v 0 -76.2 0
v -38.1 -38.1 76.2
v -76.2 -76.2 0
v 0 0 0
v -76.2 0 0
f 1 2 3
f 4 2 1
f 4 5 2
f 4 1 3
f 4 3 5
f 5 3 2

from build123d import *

# Parameters (mm, degrees)
F0_W     = 76.2
F0_H     = 76.2
F1_DEPTH = 76.2
F4_DEPTH = 76.2
F5_DEPTH = 76.2


with BuildPart() as f1:
    # F0 (on Right) → F1 (new body)
    with BuildSketch(Plane.YZ):
        with Locations((-38.1, 38.1)):
            Rectangle(F0_W, F0_H)
    extrude(amount=-F1_DEPTH)

    # F3 (on face) → F4 (cut)
    with BuildSketch(Plane(origin=(-76.2, 0, 0), x_dir=(0, -1, 0), z_dir=(-1, 0, 0))):
        Polygon((0, 76.2), (0, 0), (38.1, 76.2), align=None)
        Polygon((38.1, 76.2), (76.2, 0), (76.2, 76.2), align=None)
    extrude(amount=-F4_DEPTH, mode=Mode.SUBTRACT)

    # F2 (on face) → F5 (cut)
    with BuildSketch(Plane.XZ.offset(76.2)):
        Polygon((-76.2, 0), (-38.1, 76.2), (-76.2, 76.2), align=None)
        Polygon((0, 76.2), (-38.1, 76.2), (0, 0), align=None)
    extrude(amount=-F5_DEPTH, mode=Mode.SUBTRACT)


solid = f1.part
